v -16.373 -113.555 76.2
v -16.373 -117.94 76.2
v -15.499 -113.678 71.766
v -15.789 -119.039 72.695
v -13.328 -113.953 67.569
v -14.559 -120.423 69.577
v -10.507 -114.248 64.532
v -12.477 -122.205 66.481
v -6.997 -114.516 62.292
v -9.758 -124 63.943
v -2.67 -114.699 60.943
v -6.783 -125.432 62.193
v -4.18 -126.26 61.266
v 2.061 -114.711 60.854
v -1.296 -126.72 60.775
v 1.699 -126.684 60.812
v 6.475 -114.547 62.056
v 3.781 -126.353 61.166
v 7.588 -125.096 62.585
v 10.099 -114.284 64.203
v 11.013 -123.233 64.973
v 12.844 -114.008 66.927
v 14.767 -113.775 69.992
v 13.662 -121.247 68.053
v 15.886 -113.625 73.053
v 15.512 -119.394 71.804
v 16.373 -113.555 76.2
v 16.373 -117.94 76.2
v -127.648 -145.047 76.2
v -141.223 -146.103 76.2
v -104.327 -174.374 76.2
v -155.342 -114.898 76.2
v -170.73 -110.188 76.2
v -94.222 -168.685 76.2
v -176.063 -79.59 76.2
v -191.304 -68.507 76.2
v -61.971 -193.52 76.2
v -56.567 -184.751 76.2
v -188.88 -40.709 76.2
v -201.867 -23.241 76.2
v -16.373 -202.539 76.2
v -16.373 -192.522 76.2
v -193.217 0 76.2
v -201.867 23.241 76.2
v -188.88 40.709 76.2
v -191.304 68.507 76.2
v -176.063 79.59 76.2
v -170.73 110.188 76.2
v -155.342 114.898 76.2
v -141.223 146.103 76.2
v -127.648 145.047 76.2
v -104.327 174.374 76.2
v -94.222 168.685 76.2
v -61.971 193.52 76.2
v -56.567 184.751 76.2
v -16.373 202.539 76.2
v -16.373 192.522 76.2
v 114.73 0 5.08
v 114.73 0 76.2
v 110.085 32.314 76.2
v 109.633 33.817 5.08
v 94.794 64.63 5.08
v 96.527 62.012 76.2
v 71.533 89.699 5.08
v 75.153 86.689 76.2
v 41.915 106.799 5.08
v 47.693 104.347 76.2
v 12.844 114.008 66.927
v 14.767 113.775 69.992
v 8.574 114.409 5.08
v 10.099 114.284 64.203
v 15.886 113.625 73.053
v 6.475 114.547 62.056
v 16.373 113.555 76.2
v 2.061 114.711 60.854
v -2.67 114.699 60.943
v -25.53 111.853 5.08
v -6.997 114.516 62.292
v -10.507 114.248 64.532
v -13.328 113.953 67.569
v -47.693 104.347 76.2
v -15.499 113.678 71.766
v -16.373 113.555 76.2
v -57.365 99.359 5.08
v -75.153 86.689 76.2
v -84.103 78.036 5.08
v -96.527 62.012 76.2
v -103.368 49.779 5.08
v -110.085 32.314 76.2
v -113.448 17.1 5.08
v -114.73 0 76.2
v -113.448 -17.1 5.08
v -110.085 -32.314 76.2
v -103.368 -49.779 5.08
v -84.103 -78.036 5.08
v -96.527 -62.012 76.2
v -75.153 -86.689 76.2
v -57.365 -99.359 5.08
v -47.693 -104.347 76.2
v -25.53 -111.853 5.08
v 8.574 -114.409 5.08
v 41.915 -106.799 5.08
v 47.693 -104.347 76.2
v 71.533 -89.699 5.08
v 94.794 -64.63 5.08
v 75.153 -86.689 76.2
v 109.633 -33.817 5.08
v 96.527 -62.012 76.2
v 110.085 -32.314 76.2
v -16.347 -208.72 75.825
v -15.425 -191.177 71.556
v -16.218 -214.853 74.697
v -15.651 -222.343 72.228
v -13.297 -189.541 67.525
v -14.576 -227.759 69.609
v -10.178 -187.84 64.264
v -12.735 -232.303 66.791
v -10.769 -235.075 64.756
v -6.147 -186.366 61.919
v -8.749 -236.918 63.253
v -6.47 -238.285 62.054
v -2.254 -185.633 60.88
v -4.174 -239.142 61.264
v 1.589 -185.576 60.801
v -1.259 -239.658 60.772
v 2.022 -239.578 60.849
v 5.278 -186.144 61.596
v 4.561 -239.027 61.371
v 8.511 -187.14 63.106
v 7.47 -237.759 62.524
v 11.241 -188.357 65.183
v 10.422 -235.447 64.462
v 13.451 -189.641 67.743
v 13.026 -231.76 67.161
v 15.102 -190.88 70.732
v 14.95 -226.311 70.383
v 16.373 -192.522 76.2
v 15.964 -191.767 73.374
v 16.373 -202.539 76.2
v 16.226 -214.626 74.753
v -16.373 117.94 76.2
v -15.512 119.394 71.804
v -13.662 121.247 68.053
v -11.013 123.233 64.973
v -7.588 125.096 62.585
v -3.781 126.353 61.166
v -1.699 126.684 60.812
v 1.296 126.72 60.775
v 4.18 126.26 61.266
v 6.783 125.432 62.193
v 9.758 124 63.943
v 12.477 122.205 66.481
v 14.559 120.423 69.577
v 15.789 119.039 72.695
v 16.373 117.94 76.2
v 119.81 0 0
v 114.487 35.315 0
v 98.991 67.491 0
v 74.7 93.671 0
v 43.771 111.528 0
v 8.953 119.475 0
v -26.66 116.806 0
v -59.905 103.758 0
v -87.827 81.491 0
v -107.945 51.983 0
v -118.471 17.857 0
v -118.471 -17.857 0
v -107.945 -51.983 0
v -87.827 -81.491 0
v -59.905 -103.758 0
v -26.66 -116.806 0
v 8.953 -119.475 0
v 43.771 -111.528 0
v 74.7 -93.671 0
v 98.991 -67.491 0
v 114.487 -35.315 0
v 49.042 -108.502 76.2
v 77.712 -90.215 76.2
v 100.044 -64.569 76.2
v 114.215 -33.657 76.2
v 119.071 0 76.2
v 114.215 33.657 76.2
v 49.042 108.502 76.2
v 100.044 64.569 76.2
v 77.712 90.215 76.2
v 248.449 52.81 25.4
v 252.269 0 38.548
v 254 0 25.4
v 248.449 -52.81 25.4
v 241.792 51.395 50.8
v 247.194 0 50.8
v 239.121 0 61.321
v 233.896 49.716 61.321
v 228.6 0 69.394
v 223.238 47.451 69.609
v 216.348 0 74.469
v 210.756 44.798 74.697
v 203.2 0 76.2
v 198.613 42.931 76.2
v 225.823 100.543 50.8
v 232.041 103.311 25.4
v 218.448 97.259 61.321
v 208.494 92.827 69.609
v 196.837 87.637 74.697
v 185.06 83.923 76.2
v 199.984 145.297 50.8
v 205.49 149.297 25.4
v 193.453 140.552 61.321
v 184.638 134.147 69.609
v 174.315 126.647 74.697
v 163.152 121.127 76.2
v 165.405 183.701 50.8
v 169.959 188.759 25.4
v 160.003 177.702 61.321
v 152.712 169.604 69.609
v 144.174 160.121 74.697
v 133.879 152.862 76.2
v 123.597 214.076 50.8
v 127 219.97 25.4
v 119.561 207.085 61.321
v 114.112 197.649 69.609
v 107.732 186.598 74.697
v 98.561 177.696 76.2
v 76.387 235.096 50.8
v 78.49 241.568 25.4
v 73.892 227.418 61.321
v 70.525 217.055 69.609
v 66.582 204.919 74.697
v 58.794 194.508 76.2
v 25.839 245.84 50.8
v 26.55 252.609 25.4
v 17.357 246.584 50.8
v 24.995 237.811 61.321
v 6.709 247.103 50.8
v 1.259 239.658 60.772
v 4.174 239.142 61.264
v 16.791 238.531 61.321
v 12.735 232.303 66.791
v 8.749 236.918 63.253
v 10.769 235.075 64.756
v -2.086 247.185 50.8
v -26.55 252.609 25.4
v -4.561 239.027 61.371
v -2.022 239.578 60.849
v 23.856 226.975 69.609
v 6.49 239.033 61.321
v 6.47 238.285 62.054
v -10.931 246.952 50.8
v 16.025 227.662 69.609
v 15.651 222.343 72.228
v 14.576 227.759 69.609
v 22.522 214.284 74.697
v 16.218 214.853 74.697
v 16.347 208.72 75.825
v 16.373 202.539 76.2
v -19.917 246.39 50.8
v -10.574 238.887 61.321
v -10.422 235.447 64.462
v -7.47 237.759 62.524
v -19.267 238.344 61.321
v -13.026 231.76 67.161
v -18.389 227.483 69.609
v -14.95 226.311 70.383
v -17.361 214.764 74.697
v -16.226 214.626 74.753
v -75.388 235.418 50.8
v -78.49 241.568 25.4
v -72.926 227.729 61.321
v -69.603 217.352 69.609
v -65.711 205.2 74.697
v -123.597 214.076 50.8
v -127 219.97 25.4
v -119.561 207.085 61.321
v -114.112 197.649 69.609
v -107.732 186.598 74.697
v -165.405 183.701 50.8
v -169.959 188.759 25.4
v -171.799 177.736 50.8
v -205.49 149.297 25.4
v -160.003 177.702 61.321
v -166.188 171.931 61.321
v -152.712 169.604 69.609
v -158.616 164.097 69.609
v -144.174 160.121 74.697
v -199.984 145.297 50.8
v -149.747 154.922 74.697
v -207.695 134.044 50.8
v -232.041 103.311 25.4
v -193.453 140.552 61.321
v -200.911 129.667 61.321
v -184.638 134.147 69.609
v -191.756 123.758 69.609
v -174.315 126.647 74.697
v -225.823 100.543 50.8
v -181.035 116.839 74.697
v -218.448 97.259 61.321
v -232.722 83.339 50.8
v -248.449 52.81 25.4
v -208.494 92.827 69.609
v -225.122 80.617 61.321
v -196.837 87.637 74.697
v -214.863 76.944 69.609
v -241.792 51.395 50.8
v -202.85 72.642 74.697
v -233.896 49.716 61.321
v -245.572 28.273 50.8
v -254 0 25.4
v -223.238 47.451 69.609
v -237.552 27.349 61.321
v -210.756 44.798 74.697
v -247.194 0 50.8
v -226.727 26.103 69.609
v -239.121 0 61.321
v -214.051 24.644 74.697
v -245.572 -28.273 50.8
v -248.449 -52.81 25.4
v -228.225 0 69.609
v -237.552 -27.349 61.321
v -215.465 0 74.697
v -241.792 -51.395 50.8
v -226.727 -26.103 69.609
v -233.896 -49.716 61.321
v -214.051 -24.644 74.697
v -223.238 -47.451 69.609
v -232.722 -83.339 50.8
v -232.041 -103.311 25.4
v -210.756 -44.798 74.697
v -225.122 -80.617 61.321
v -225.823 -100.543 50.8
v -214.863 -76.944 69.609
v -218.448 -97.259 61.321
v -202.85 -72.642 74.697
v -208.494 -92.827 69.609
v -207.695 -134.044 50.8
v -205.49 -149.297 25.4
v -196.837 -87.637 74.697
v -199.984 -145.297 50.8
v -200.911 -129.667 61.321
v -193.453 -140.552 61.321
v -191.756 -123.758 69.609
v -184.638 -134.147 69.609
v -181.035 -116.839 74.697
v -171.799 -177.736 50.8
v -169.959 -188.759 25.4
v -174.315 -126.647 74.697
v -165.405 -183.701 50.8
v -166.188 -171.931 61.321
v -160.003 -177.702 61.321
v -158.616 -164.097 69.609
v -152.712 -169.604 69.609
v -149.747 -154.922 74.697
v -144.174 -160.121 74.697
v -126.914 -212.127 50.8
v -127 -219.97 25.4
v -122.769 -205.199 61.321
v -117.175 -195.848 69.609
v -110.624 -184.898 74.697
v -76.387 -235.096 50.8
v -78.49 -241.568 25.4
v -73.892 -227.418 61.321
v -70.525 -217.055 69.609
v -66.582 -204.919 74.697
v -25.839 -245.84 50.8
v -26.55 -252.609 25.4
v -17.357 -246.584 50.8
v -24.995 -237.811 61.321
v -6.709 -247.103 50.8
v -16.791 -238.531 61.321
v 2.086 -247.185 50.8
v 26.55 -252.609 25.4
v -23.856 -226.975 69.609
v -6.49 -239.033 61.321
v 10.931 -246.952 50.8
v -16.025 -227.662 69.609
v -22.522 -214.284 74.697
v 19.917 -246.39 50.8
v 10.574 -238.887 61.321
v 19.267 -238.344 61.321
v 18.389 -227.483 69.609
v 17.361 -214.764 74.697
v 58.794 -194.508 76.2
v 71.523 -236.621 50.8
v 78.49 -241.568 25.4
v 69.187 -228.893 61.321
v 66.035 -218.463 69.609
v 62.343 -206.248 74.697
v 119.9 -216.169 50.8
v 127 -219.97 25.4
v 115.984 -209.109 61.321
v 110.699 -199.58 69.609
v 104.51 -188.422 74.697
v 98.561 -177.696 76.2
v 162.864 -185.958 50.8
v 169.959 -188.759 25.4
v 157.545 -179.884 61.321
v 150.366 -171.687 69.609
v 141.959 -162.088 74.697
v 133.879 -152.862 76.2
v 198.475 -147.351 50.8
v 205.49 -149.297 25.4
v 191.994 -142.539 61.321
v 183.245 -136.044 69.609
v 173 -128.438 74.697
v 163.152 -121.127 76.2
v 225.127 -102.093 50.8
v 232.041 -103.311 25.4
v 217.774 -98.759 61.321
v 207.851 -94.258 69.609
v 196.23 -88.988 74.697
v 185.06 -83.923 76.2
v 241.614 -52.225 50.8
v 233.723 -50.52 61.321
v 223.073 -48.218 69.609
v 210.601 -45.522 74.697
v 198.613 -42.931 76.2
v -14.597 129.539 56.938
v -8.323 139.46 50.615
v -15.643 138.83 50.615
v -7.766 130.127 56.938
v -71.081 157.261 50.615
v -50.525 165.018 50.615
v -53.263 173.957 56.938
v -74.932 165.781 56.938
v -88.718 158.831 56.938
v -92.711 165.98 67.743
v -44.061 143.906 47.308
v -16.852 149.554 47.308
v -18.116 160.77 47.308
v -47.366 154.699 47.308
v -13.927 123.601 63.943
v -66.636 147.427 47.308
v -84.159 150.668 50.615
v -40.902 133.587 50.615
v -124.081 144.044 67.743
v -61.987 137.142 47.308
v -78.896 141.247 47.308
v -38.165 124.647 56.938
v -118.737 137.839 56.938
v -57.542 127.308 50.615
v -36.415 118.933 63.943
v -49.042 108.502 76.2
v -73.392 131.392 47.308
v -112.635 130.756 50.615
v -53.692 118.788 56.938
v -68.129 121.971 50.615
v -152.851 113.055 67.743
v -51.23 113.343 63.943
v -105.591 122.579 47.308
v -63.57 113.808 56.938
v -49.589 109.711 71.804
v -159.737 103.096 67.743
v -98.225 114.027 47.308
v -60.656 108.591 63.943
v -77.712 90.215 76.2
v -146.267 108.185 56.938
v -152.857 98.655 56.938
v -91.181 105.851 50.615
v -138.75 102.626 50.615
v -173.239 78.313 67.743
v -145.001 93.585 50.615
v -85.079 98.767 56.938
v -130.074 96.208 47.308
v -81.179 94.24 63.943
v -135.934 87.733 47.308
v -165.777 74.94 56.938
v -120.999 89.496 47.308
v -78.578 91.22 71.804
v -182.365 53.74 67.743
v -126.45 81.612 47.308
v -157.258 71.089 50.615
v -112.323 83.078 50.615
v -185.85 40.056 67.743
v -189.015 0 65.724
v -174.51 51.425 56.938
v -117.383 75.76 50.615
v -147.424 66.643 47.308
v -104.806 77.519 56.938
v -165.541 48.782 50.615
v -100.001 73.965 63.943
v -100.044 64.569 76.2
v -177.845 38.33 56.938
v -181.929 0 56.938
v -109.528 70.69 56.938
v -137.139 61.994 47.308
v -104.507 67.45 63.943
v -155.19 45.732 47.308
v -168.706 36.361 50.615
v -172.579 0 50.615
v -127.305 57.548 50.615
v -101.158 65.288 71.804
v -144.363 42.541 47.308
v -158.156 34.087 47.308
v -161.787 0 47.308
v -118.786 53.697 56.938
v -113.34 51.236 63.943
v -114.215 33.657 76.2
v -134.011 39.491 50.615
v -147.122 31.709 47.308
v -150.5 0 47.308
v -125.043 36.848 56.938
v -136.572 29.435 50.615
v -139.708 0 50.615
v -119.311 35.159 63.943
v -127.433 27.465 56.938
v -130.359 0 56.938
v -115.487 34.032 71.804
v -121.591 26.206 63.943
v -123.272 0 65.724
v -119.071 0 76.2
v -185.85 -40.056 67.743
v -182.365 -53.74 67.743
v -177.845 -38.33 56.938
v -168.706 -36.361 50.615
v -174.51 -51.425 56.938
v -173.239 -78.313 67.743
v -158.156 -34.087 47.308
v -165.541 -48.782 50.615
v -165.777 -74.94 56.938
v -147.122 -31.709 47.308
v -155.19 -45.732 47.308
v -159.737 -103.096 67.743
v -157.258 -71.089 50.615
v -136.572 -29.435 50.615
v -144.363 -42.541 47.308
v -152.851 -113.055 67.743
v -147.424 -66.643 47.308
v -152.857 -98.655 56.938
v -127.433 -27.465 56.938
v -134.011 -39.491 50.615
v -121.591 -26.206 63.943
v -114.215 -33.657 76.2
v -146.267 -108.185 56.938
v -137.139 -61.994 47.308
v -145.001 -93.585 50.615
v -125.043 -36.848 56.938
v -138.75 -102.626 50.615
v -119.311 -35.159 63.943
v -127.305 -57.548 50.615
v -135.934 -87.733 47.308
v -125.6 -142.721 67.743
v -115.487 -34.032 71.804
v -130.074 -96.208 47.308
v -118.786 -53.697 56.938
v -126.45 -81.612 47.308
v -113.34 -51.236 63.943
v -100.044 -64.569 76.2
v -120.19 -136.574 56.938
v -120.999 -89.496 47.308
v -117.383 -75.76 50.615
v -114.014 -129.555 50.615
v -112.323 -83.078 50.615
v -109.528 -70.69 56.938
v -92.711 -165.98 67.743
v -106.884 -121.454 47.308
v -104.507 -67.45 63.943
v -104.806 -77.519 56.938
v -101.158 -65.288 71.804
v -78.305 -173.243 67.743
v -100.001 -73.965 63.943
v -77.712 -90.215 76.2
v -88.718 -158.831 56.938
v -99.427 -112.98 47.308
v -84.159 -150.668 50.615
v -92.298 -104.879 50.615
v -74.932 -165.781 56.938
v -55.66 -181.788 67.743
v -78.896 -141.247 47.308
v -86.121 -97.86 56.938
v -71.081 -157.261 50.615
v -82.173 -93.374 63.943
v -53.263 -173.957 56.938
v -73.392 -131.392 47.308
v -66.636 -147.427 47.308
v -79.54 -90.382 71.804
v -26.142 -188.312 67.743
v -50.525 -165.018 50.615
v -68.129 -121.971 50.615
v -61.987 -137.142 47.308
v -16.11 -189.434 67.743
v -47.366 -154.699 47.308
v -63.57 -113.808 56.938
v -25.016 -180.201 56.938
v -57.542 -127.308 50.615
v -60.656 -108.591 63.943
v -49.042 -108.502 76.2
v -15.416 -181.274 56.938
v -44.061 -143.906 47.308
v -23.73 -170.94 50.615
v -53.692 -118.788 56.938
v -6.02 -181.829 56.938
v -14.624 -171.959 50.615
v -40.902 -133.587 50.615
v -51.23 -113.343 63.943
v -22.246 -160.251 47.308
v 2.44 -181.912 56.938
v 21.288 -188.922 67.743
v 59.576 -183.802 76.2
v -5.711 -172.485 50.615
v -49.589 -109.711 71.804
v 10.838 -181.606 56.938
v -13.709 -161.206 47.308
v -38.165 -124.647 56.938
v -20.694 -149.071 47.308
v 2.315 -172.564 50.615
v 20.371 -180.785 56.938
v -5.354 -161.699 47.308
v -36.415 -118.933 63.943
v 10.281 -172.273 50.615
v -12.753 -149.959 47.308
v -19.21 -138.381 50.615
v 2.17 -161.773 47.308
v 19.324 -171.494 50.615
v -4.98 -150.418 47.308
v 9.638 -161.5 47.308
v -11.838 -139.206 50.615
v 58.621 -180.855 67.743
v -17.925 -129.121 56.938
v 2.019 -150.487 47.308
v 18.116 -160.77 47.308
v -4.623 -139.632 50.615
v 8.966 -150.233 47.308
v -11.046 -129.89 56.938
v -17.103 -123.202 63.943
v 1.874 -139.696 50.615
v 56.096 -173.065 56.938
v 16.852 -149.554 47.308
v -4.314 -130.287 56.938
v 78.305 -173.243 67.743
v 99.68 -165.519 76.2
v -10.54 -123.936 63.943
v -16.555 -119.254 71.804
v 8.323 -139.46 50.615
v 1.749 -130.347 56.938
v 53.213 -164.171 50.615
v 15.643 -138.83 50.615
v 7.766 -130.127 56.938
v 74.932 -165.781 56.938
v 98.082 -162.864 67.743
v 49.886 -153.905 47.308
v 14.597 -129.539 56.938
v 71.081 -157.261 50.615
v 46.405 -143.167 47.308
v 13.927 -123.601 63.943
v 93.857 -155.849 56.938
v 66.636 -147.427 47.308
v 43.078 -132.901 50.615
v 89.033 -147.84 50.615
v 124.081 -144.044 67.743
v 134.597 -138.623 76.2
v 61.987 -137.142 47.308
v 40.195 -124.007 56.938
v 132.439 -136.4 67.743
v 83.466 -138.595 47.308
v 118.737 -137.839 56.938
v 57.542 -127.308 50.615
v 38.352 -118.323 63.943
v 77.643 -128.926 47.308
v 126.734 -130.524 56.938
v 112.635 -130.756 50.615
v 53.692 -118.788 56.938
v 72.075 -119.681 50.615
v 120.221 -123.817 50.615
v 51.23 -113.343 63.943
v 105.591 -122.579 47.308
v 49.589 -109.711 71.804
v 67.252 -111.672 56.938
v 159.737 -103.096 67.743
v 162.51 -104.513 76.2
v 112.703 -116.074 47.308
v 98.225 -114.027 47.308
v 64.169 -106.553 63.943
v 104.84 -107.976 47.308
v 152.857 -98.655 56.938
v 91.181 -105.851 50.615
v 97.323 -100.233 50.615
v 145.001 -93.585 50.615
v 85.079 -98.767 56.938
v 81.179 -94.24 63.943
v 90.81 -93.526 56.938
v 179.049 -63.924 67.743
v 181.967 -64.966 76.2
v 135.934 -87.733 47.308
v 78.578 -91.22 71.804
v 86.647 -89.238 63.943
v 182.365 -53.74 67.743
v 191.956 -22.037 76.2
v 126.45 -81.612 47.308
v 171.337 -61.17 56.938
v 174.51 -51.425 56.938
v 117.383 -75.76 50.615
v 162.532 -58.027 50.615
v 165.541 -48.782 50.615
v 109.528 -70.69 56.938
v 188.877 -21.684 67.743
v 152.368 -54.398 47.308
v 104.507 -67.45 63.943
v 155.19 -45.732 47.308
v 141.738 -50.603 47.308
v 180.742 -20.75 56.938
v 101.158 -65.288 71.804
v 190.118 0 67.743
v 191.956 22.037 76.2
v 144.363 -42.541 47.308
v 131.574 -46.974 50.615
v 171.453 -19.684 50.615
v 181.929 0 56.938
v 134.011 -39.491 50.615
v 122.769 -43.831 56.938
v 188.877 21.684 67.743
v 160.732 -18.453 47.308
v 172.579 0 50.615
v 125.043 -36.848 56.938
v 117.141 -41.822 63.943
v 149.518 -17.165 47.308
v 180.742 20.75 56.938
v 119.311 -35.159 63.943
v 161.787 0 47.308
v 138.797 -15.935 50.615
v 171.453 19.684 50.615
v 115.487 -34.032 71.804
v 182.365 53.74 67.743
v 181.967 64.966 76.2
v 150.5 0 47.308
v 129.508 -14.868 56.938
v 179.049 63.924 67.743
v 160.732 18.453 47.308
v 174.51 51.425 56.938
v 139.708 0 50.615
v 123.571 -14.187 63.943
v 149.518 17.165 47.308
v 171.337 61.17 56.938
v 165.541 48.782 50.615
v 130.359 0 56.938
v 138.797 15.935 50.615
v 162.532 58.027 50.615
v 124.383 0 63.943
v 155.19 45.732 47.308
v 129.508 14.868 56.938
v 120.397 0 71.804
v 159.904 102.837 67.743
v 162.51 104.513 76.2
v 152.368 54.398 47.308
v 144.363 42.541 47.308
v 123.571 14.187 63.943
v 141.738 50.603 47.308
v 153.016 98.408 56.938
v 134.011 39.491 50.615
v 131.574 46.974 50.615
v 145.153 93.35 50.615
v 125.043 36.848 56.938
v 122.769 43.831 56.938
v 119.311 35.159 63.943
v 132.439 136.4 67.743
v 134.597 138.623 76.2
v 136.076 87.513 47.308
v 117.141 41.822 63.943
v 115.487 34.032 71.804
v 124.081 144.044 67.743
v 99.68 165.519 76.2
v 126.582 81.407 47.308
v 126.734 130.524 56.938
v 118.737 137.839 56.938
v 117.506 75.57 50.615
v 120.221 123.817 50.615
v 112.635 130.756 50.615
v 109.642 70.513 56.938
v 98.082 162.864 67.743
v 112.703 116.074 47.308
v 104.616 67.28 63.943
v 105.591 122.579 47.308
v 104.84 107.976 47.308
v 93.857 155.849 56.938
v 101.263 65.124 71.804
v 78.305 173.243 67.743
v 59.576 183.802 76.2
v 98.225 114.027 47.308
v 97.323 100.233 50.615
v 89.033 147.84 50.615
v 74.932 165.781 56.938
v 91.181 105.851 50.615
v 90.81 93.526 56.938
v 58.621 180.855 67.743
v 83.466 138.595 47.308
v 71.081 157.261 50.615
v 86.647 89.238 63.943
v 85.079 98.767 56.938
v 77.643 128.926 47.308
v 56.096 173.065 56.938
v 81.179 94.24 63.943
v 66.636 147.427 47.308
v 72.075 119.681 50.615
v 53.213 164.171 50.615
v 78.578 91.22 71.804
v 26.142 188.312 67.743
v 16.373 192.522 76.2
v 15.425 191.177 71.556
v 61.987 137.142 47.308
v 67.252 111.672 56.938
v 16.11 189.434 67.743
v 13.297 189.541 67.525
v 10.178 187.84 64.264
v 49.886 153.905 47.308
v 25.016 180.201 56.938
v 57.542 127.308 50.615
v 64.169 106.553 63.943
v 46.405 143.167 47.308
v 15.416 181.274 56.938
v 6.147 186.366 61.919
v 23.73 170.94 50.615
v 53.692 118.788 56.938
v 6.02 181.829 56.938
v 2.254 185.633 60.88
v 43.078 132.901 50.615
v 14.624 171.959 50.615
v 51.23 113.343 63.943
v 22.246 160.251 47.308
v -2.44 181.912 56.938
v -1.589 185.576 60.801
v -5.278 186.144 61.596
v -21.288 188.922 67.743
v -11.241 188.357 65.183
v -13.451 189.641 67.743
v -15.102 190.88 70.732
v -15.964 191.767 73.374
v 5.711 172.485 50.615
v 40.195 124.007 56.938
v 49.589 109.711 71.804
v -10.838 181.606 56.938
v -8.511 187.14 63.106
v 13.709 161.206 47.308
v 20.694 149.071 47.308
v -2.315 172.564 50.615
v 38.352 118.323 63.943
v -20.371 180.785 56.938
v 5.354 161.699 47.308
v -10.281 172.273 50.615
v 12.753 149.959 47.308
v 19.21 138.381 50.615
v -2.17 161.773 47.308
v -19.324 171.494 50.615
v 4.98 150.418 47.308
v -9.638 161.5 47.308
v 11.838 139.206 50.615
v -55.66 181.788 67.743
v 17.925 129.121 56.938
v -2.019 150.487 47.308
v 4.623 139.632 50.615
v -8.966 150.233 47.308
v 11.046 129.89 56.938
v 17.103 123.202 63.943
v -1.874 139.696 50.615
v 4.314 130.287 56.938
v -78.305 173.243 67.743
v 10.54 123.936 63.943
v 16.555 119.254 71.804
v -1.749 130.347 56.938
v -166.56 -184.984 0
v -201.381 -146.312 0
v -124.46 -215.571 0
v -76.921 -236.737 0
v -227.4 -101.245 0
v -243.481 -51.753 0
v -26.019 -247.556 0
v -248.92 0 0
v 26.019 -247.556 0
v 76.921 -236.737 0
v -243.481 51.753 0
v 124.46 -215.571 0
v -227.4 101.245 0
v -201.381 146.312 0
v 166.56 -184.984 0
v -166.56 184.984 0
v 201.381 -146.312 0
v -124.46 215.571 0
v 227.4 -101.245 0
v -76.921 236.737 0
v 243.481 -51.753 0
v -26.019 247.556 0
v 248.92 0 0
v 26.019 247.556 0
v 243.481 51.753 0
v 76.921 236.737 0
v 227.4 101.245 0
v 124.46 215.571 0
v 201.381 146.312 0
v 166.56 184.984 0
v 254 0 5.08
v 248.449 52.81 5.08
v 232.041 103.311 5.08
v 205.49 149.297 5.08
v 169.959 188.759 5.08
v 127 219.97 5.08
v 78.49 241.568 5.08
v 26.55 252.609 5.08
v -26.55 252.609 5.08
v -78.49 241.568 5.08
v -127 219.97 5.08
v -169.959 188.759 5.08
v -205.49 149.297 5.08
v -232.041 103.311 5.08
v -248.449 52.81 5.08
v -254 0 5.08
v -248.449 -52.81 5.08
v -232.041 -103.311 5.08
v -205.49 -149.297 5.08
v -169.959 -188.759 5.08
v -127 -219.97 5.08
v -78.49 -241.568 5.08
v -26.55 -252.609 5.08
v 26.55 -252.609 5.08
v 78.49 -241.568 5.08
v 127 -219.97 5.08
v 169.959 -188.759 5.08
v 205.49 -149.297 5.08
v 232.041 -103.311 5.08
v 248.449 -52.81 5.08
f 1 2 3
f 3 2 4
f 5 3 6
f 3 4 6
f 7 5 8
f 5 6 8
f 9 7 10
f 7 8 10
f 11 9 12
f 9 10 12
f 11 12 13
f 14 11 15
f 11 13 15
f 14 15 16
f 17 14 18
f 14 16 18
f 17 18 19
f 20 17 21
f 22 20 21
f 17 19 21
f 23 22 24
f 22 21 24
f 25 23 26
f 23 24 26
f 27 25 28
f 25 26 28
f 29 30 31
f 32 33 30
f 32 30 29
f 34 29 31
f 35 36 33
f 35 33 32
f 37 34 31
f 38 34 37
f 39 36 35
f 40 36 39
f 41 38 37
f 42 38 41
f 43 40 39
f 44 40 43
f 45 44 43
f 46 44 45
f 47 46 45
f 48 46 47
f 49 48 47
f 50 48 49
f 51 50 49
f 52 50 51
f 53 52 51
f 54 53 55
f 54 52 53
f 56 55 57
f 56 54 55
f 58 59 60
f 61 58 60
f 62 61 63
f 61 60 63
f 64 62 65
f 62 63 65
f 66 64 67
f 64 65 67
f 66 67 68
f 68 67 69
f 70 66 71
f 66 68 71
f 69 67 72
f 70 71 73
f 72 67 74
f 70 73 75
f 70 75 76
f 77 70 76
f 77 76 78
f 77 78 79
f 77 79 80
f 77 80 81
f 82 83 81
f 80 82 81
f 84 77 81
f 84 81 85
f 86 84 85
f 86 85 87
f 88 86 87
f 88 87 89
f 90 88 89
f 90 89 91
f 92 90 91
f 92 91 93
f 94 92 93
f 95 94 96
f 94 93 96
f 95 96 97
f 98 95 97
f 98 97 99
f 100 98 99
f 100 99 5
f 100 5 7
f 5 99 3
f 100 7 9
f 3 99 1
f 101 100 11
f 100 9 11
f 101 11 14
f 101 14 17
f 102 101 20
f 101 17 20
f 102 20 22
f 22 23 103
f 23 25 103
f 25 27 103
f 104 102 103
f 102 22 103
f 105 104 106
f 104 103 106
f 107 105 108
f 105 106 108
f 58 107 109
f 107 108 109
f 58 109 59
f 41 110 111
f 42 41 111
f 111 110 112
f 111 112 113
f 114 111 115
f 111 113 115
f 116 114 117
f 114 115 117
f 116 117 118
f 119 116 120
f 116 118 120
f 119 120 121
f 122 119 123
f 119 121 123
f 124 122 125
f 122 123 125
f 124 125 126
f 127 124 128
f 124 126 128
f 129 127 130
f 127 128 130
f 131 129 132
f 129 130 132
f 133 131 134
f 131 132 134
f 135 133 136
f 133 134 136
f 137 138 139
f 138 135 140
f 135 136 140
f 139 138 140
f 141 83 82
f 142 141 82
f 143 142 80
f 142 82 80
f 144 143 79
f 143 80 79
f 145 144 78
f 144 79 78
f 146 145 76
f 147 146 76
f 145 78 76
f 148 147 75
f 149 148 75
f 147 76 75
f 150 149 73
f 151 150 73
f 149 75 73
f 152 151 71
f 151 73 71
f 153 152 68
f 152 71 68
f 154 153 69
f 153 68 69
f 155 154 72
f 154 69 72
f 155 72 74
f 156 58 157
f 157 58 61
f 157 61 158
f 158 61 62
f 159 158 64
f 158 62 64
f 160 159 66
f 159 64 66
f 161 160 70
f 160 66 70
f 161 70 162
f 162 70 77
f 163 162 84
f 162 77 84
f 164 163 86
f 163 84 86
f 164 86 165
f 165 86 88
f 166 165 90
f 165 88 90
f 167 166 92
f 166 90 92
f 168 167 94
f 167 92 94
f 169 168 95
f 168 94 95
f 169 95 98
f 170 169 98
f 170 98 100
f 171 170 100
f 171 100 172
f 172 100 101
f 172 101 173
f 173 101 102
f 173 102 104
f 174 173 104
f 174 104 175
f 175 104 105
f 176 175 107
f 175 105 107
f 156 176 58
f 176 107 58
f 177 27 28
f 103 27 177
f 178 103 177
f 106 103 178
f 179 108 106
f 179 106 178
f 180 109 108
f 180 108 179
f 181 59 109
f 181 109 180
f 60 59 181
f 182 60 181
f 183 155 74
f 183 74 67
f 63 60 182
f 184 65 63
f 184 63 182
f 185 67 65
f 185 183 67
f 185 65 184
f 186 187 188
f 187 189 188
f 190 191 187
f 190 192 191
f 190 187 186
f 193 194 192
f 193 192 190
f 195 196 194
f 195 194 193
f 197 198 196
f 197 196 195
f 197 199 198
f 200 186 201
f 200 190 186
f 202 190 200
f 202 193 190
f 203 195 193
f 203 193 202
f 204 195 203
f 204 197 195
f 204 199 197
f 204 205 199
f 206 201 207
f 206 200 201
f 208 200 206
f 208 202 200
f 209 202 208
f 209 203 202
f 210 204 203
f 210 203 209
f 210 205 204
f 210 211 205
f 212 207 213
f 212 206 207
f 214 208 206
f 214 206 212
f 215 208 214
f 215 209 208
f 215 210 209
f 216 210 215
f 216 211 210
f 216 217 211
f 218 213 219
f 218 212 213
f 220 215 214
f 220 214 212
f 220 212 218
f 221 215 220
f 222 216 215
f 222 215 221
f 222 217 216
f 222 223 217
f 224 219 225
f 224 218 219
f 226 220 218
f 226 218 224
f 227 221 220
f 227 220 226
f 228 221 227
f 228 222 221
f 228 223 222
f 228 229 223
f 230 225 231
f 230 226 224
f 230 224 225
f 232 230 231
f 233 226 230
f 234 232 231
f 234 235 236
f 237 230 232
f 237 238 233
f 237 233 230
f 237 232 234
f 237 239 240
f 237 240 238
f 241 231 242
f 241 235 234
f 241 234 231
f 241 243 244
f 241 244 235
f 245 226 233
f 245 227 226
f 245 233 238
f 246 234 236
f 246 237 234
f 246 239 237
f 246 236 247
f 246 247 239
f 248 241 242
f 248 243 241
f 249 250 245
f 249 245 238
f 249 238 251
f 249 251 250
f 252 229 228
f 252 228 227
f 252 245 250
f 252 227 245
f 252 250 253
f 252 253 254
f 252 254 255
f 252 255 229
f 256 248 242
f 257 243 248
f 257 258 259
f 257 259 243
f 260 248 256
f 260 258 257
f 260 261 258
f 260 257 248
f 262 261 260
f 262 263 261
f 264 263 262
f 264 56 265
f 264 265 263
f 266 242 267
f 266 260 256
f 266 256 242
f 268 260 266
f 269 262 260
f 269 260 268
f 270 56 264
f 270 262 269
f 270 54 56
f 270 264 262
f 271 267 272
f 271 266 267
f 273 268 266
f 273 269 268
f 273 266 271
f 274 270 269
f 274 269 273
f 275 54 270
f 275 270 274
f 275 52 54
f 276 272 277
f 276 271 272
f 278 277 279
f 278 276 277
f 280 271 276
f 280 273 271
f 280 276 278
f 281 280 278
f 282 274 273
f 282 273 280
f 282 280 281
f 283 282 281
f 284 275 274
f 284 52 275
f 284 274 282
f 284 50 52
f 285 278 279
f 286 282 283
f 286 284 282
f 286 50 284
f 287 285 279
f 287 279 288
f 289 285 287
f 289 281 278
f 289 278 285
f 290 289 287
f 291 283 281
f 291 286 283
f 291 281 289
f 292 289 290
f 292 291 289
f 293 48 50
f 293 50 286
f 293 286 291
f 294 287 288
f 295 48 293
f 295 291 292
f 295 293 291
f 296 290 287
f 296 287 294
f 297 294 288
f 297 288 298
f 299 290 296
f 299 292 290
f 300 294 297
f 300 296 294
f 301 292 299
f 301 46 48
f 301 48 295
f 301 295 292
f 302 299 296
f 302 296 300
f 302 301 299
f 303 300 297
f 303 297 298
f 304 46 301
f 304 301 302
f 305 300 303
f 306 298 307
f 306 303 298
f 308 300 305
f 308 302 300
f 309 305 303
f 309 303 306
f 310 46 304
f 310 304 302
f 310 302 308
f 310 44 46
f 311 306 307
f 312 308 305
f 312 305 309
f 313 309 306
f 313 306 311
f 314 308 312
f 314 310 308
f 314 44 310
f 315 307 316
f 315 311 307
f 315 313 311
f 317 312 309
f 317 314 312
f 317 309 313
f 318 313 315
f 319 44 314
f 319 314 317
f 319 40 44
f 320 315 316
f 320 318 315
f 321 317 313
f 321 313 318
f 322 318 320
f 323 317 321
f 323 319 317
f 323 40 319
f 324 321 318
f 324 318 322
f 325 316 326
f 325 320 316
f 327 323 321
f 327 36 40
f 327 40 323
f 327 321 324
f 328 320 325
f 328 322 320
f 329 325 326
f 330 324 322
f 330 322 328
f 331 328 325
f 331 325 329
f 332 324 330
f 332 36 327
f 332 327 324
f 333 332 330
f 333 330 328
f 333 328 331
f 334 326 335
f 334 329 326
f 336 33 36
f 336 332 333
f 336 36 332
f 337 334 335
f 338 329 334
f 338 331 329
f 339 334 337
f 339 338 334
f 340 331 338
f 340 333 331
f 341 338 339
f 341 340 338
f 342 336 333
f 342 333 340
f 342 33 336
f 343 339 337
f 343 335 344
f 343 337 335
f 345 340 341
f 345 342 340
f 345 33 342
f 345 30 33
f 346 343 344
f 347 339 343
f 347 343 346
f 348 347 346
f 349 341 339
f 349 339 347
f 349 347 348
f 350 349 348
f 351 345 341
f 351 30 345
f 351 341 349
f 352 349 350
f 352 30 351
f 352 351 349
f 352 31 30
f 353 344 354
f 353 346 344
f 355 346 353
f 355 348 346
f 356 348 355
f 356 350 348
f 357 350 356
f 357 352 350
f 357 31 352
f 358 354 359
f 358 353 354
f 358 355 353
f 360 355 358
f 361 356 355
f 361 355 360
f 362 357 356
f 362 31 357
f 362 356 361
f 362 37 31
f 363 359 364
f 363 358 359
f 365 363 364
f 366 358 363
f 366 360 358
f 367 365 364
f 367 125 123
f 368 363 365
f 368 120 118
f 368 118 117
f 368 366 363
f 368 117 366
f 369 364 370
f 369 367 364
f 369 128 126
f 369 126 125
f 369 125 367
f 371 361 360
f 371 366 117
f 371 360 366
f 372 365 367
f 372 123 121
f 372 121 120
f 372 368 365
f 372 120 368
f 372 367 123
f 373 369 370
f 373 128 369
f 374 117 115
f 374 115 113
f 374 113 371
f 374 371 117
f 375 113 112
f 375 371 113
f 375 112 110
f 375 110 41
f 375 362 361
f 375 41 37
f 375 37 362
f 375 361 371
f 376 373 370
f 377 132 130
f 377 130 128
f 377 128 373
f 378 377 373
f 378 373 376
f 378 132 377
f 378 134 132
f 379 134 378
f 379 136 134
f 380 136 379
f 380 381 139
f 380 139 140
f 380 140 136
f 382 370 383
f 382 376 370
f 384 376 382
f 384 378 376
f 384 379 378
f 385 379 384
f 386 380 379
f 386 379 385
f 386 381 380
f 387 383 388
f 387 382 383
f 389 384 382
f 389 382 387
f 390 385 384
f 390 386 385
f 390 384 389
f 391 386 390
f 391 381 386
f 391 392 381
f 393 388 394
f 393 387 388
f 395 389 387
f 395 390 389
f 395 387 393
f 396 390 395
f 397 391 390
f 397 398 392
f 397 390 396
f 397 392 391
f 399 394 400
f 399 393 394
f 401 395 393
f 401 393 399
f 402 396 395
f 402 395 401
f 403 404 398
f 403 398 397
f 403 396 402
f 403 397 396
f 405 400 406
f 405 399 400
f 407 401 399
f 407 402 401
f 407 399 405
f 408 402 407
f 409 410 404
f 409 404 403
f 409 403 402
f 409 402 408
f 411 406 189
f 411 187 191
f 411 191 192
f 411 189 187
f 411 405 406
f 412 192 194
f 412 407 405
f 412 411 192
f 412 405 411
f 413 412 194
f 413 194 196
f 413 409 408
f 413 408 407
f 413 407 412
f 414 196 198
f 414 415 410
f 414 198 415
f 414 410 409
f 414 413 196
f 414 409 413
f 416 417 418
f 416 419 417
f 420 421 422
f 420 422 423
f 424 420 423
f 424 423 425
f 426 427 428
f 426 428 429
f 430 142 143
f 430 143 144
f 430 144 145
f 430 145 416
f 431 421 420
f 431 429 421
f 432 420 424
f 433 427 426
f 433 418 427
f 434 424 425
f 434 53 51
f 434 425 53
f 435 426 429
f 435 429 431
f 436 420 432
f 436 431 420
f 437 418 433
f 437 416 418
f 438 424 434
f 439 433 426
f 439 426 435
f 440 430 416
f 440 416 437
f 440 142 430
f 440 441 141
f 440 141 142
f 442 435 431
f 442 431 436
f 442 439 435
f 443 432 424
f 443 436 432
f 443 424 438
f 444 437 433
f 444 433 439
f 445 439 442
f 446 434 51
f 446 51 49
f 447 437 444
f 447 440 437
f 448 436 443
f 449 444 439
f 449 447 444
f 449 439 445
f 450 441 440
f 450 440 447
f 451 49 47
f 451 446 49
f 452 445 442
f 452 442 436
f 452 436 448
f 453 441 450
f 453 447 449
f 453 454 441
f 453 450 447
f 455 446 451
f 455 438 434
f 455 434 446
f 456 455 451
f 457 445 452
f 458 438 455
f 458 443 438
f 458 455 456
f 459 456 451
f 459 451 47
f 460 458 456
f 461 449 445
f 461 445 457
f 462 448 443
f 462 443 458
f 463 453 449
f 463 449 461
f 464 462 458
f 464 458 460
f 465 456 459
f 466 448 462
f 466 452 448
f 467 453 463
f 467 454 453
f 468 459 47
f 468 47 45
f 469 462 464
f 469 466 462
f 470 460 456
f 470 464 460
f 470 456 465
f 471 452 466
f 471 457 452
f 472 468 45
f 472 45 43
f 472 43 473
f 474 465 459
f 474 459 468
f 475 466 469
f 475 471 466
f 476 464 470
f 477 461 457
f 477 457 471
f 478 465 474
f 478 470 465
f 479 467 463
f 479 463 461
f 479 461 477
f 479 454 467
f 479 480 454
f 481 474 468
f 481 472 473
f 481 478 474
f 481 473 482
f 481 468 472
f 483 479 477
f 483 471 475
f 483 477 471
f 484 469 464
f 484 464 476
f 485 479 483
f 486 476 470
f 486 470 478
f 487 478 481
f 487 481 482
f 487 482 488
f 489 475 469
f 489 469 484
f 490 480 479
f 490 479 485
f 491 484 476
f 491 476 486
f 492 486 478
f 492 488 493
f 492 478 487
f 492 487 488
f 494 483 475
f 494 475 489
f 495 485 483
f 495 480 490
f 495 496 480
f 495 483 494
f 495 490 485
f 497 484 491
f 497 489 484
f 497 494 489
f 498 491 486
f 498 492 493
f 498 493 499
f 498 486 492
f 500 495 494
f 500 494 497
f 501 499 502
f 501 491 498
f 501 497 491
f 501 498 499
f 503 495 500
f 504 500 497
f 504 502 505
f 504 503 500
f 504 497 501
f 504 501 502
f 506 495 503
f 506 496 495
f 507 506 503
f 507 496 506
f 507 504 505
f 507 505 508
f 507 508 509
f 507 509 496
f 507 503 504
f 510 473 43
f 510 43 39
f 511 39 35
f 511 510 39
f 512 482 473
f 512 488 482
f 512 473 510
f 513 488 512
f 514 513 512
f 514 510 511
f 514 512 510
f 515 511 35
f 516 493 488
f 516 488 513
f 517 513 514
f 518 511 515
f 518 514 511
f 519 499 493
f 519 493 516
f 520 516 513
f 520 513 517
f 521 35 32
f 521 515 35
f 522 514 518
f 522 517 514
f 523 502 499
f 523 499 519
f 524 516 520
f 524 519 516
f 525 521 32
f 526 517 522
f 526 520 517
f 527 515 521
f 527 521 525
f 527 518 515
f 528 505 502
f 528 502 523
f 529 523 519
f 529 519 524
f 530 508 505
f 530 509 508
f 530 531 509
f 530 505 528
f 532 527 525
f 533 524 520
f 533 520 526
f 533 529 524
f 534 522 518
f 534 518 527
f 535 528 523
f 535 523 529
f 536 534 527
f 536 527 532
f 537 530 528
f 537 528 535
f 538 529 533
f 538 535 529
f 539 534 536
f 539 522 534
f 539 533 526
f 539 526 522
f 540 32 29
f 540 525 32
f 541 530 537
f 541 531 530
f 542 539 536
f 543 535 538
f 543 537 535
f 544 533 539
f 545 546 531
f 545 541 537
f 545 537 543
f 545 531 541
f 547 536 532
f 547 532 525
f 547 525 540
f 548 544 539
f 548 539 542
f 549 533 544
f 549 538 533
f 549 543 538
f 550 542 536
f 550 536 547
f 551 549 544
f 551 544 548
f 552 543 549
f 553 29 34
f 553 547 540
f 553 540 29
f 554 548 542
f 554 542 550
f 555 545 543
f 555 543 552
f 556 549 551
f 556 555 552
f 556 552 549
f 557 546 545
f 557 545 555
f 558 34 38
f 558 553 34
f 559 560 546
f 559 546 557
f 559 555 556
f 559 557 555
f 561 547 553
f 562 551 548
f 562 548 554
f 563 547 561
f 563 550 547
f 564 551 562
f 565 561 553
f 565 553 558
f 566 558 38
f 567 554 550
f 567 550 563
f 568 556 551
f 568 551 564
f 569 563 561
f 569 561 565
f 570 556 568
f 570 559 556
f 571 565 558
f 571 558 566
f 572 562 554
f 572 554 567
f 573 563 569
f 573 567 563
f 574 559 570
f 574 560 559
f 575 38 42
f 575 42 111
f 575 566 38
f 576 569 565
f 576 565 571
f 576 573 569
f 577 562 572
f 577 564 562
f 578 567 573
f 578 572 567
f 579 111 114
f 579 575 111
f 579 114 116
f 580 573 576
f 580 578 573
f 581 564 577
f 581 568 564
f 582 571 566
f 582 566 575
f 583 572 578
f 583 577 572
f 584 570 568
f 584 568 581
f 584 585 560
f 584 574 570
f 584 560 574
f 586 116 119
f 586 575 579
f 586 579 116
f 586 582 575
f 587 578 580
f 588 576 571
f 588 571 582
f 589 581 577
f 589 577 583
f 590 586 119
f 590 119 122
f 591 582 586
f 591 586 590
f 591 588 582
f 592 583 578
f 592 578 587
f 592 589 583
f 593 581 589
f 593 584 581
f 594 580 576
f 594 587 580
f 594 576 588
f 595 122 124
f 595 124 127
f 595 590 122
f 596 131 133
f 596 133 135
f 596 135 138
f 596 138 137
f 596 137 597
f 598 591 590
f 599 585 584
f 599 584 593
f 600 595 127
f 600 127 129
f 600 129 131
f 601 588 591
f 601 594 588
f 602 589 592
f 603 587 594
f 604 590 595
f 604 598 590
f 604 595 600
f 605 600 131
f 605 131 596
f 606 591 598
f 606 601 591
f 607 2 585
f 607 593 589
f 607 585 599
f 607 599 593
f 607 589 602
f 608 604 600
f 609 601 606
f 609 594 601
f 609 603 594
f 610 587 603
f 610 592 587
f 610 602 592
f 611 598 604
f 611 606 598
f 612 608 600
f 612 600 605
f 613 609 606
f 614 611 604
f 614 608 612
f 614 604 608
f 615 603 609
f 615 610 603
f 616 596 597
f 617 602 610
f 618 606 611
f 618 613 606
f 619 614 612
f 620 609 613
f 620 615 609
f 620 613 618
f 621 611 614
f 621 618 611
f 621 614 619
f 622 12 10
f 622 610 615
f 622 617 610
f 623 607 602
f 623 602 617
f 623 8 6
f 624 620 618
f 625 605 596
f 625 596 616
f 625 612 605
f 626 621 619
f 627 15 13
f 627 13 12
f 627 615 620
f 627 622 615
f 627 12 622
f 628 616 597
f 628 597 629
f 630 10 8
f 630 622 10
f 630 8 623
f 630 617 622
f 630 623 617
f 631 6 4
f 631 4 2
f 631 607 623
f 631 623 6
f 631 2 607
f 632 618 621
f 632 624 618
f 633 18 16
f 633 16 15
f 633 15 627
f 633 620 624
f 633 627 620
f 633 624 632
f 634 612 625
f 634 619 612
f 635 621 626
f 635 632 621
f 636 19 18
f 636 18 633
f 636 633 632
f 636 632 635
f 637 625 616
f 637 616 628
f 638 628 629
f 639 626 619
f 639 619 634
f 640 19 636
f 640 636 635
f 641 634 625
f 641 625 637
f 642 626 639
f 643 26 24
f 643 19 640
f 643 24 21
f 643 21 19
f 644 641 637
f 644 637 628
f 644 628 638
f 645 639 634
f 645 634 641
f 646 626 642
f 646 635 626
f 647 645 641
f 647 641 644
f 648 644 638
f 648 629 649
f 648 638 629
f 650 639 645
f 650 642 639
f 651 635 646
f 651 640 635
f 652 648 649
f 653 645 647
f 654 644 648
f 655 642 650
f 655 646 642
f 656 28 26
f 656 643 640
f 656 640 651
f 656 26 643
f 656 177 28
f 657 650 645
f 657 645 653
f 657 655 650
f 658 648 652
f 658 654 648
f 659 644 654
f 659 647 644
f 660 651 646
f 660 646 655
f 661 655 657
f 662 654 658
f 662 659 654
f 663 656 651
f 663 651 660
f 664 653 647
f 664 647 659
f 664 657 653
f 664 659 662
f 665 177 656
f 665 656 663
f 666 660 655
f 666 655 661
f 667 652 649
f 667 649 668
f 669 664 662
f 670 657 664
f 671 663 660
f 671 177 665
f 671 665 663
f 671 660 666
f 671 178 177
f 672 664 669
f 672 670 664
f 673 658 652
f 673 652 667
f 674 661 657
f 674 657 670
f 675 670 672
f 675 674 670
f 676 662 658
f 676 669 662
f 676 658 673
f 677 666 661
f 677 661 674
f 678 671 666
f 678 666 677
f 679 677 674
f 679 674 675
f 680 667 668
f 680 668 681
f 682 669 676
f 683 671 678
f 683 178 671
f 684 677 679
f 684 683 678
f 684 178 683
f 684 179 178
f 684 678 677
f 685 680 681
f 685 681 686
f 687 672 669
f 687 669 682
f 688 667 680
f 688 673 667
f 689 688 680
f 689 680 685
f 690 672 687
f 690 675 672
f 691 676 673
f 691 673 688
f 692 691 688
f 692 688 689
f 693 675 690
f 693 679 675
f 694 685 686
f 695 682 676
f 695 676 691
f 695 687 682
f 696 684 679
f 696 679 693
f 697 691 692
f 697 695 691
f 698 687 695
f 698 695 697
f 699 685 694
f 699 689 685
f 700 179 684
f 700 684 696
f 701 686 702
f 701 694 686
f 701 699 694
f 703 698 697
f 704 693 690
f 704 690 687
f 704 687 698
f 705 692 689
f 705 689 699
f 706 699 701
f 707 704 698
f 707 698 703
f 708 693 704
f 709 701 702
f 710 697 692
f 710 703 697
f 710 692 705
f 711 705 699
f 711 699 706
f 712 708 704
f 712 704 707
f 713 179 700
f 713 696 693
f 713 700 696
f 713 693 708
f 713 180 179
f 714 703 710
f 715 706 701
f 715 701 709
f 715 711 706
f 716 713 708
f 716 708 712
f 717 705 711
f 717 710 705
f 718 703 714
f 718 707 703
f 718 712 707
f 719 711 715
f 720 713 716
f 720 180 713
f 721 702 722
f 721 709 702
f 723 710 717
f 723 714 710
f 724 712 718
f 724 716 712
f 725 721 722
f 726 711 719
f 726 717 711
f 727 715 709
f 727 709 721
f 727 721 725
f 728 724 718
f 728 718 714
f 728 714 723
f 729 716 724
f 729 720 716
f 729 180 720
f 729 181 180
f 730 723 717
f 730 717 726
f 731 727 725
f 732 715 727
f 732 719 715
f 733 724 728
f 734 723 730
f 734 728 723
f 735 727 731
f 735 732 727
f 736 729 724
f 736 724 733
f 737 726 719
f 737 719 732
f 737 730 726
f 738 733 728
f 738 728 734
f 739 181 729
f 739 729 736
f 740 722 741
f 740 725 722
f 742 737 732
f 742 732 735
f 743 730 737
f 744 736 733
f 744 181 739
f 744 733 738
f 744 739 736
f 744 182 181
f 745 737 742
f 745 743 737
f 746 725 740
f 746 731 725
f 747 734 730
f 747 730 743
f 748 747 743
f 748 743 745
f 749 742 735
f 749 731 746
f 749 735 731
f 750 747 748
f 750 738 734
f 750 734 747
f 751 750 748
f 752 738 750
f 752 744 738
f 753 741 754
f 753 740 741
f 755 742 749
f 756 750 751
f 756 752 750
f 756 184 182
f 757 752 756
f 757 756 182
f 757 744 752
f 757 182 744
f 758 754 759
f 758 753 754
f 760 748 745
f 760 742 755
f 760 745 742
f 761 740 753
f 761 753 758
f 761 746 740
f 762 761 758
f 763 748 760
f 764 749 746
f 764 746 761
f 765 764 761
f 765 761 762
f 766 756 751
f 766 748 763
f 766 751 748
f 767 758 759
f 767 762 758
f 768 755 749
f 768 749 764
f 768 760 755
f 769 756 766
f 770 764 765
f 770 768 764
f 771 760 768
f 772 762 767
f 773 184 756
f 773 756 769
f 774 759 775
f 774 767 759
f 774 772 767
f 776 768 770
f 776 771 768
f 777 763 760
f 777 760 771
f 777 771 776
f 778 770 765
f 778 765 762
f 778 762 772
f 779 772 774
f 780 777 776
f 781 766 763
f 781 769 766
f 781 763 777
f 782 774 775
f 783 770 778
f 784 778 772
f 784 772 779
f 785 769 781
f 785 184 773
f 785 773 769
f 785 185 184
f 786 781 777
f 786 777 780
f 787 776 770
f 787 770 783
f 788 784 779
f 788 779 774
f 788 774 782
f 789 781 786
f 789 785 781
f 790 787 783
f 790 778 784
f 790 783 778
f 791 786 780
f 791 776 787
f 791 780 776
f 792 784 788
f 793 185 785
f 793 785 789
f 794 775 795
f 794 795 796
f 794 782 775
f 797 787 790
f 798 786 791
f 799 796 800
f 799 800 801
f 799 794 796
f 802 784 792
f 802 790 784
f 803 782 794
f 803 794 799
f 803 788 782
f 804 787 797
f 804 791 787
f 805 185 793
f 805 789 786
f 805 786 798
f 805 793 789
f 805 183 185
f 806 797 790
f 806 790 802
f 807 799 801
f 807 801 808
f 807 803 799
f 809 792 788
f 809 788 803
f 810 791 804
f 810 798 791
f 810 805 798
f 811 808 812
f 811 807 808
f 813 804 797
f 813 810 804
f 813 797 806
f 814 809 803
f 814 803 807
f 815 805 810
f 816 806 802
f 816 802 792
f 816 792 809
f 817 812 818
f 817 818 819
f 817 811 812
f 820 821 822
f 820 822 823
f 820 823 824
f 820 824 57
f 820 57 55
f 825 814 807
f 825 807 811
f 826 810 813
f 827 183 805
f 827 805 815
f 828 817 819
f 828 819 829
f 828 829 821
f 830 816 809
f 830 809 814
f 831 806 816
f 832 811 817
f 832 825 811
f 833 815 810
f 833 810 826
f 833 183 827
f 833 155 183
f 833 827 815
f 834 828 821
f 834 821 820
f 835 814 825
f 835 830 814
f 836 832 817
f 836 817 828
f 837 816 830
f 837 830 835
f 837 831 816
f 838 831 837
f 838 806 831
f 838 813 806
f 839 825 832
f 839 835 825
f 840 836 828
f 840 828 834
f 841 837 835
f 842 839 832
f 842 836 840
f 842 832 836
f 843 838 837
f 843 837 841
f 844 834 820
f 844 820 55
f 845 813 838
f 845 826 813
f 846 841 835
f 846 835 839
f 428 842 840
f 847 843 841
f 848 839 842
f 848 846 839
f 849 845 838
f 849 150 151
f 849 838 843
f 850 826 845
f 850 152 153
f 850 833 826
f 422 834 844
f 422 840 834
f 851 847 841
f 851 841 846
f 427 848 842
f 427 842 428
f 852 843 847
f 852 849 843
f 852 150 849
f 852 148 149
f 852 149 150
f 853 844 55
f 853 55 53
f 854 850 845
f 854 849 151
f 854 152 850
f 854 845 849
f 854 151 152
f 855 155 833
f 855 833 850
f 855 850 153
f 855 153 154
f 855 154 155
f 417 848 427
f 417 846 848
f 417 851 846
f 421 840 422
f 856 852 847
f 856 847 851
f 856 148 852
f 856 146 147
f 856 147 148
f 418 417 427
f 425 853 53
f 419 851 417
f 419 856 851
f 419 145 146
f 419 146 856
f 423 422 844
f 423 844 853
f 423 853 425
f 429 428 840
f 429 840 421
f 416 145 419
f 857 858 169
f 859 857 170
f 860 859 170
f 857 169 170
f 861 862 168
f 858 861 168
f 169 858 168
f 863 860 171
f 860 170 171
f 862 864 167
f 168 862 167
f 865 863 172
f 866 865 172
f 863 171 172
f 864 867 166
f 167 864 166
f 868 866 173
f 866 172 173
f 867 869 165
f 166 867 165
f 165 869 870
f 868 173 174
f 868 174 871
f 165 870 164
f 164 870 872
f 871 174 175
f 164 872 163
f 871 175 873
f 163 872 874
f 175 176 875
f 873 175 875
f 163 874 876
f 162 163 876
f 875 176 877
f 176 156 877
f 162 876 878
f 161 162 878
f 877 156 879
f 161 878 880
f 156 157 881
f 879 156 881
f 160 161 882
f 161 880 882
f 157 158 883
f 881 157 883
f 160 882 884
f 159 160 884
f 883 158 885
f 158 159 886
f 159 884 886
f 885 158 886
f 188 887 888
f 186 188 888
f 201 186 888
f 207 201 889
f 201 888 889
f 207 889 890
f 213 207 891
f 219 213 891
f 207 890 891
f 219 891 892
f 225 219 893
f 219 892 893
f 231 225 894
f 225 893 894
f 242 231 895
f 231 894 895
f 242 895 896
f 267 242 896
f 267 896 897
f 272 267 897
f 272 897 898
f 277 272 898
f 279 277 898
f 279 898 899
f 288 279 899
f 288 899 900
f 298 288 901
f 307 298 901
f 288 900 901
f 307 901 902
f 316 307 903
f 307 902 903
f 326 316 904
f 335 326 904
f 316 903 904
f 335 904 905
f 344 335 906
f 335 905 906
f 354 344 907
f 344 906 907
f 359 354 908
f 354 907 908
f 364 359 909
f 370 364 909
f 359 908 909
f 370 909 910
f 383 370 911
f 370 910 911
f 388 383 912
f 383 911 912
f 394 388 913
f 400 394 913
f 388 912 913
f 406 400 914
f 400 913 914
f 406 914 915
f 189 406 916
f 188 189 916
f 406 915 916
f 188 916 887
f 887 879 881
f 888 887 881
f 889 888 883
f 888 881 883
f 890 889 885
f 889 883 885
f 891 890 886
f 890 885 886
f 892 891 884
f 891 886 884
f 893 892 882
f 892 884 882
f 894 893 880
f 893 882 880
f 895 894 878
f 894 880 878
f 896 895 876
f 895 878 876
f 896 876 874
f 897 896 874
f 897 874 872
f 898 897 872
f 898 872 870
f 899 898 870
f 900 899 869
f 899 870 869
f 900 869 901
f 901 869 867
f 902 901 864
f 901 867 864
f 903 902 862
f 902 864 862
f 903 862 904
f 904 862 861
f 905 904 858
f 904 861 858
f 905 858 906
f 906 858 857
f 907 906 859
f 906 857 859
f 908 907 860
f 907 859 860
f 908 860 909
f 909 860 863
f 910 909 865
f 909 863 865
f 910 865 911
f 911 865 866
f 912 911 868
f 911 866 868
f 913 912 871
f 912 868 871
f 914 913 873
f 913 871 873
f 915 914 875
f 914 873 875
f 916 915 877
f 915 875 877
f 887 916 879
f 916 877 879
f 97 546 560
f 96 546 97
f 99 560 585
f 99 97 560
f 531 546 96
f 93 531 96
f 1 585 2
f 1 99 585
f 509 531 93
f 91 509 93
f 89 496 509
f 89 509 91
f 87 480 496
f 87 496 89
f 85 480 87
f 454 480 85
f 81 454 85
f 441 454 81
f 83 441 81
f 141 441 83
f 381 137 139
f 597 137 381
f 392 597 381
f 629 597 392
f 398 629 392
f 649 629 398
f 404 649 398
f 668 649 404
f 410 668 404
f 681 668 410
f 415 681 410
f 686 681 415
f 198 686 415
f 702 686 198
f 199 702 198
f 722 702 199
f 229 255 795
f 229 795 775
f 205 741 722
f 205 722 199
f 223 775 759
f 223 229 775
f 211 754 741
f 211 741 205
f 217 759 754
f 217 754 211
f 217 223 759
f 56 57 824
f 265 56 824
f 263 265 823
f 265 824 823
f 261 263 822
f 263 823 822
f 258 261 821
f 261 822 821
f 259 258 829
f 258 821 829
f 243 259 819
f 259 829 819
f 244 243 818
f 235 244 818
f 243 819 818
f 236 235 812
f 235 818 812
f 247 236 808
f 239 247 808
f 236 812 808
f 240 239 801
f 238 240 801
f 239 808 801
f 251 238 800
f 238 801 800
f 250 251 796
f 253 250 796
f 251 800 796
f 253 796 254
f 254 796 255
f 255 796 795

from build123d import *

# Parameters (mm, degrees)
F0_R     = 254
F1_DEPTH = 76.2
F2_R     = 50.8
F3_SIZE  = 5.08
F4_R     = 114.7296539916
F5_DEPTH = 76.201
F6_R     = 38.1
F8_R     = 16.3985749671
F9_DEPTH = 388.62
F10_SIZE = 5.08


with BuildPart() as f1:
    # F0 (on Top) → F1 (new body)
    with BuildSketch(Plane.XY):
        Circle(F0_R)
    extrude(amount=F1_DEPTH)

    # F2
    f2_edges = [f1.edges().sort_by_distance(p)[0] for p in [
        (-254, 0, 76.2),
    ]]
    fillet(f2_edges, radius=F2_R)

    # F3
    f3_edges = [f1.edges().sort_by_distance(p)[0] for p in [
        (-254, 0, 0),
    ]]
    chamfer(f3_edges, length=F3_SIZE)

    # F4 (on face) → F5 (cut, through all)
    with BuildSketch(Plane.XY.offset(76.2)):
        Circle(F4_R)
    extrude(amount=-F5_DEPTH, mode=Mode.SUBTRACT)

    # F6 (on Front) → F7 (revolve, cut)
    with BuildSketch(Plane.XZ):
        with Locations((-156.143784523, 84.9872082472)):
            Circle(F6_R)
    revolve(axis=Axis((0, 0, 25.4), (0, 0, 1)), mode=Mode.SUBTRACT)

    # F8 (on Front) → F9 (cut, symmetric)
    with BuildSketch(Plane.XZ):
        with Locations((0, 77.1225020289)):
            Circle(F8_R)
    extrude(amount=F9_DEPTH, both=True, mode=Mode.SUBTRACT)

    # F10
    f10_edges = [f1.edges().sort_by_distance(p)[0] for p in [
        (-114.729654, 0, 0),
    ]]
    chamfer(f10_edges, length=F10_SIZE)


solid = f1.part
